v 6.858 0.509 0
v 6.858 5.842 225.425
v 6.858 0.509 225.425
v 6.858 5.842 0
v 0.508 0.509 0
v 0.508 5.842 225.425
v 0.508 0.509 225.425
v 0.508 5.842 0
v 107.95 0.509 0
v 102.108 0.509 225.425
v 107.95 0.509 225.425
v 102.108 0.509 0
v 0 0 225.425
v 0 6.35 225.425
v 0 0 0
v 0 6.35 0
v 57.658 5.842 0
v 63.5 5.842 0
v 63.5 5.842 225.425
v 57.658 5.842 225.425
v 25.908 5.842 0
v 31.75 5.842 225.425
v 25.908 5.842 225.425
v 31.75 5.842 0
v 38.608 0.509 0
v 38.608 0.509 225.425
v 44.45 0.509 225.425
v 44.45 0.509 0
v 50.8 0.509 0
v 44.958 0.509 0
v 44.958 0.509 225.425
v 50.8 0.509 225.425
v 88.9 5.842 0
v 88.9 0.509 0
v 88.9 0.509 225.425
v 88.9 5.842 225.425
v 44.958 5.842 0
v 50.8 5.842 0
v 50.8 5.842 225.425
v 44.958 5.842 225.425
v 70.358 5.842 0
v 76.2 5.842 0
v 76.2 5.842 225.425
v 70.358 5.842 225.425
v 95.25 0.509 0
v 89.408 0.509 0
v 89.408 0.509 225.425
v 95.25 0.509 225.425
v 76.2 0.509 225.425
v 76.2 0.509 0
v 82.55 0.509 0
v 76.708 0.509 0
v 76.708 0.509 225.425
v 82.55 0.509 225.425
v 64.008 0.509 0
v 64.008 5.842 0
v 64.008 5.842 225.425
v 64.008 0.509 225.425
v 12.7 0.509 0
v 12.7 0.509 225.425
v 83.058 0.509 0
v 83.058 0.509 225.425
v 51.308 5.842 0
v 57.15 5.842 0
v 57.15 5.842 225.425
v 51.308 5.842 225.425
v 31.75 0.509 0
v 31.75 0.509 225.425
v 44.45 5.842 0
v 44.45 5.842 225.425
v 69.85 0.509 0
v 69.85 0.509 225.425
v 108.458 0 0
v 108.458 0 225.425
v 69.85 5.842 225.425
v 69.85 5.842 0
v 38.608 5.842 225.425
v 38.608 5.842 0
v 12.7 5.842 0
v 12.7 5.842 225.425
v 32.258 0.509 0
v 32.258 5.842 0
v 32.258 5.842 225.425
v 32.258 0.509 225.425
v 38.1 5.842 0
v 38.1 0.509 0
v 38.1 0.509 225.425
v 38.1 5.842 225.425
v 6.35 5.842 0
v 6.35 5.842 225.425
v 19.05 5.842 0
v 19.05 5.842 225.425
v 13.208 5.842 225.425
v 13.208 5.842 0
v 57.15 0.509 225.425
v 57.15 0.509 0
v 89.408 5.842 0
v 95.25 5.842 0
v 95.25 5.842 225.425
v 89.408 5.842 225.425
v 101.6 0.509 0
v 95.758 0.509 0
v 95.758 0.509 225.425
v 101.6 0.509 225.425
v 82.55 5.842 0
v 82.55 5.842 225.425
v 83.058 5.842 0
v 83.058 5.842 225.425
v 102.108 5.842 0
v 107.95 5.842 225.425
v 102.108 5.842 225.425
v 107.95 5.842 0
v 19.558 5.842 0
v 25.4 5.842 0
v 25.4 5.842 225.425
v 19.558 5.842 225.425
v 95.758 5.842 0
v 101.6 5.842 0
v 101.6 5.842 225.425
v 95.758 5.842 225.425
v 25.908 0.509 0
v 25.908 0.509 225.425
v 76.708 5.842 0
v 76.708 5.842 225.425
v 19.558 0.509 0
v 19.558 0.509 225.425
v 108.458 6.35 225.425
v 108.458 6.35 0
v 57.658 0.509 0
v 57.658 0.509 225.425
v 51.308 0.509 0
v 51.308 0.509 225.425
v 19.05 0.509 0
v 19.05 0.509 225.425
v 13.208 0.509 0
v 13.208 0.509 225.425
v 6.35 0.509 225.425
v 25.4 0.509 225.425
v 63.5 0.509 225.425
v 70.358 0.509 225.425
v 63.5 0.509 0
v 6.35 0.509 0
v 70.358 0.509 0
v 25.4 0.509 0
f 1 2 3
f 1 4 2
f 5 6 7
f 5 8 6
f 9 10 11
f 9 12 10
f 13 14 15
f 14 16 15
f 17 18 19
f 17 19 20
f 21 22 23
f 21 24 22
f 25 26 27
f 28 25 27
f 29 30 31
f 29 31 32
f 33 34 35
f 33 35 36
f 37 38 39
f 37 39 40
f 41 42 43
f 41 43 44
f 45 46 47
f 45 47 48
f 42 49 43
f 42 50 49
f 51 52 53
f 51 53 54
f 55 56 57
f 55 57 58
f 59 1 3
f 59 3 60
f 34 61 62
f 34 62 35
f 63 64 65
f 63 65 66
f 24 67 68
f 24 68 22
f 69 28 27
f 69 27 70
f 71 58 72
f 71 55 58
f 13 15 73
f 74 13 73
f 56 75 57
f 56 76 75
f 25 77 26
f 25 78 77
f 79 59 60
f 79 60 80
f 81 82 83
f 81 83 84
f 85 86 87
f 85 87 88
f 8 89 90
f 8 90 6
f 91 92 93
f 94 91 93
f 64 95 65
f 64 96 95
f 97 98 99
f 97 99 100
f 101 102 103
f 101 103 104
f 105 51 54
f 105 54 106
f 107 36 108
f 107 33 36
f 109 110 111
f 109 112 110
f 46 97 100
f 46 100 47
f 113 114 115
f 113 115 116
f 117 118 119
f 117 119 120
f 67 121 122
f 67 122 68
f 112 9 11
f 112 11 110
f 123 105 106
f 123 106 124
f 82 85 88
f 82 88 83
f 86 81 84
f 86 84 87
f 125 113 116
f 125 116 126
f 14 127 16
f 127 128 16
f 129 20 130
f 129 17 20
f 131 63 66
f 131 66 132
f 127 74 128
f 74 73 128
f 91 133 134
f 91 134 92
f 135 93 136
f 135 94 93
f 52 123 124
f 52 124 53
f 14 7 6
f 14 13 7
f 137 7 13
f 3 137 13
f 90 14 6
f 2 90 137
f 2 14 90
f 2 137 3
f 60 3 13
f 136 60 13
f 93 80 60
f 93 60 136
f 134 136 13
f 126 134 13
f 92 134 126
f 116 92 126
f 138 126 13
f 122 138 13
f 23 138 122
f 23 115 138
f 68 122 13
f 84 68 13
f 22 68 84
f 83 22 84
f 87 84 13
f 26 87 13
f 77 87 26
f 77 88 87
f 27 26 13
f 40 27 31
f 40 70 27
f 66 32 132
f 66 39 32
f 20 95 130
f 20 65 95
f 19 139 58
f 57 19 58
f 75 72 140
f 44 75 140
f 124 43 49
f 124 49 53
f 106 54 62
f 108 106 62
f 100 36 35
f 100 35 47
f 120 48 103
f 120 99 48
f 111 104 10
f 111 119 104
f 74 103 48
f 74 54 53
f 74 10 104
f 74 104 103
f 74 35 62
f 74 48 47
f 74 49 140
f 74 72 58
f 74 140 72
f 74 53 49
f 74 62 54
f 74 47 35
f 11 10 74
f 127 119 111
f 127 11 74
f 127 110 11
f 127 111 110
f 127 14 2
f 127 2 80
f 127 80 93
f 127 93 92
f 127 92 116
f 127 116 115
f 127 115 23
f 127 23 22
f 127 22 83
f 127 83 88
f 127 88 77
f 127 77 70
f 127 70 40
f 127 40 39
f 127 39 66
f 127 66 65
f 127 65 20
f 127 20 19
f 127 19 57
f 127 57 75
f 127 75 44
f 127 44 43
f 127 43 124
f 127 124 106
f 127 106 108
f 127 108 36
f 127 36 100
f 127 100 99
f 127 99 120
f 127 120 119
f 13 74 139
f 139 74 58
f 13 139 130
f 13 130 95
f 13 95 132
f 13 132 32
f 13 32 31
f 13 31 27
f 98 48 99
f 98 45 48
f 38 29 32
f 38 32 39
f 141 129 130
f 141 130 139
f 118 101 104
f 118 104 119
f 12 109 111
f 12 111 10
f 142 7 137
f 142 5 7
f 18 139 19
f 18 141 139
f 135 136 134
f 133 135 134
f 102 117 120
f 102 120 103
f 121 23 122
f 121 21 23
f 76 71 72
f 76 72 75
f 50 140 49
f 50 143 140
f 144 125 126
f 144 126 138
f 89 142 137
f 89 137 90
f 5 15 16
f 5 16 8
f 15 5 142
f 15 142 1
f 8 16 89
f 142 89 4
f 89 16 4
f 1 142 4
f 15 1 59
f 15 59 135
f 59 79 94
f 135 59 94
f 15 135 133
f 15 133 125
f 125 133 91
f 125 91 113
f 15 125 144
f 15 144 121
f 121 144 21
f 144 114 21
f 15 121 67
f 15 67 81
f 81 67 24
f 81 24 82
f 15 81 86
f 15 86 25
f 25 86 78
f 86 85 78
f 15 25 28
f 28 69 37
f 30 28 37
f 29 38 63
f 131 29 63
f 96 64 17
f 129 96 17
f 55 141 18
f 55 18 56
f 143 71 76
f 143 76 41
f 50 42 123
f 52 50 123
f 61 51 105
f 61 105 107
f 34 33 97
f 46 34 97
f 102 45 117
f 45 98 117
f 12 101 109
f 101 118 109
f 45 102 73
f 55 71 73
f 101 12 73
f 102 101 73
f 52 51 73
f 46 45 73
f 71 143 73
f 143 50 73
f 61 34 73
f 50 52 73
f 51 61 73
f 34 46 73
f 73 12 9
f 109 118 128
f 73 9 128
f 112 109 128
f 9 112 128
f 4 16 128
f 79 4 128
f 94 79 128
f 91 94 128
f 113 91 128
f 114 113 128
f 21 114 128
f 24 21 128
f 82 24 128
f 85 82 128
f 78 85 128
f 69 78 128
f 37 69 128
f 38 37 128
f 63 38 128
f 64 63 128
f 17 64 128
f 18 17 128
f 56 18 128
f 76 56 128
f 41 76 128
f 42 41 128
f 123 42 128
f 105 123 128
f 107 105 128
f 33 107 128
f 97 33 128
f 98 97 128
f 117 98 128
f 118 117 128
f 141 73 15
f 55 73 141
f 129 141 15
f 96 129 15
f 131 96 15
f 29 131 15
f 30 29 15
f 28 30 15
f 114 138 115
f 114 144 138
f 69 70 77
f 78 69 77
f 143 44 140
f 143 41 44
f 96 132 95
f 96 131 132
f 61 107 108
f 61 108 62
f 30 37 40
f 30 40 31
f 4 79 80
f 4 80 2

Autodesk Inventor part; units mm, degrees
ref_plane "YZ Plane" through (0, 0, 0) normal (1, 0, 0) x (0, 1, 0)
ref_plane "XZ Plane" through (0, 0, 0) normal (0, 1, 0) x (-1, 0, 0)
ref_plane "XY Plane" through (0, 0, 0) normal (0, 0, 1) x (1, 0, 0)
sketch "Sketch1" plane through (0, 0, 0) normal (0, 0, 1) x (1, 0, 0)
  line L0 (0, 0) -> (108.458, 0)
  line L1 (108.458, 0) -> (108.458, 6.35)
  line L2 (108.458, 6.35) -> (0, 6.35)
  line L3 (0, 6.35) -> (0, 0)
  line L4 (0.508, 0.5094) -> (6.35, 0.5094)
  line L5 (6.35, 0.5094) -> (6.35, 5.842)
  line L6 (6.35, 5.842) -> (0.508, 5.842)
  line L7 (0.508, 5.842) -> (0.508, 0.5094)
  line L8 (6.858, 0.5094) -> (12.7, 0.5094)
  line L9 (12.7, 0.5094) -> (12.7, 5.842)
  line L10 (12.7, 5.842) -> (6.858, 5.842)
  line L11 (6.858, 5.842) -> (6.858, 0.5094)
  line L12 (13.208, 0.5094) -> (19.05, 0.5094)
  line L13 (19.05, 0.5094) -> (19.05, 5.842)
  line L14 (19.05, 5.842) -> (13.208, 5.842)
  line L15 (13.208, 5.842) -> (13.208, 0.5094)
  line L16 (19.558, 0.5094) -> (25.4, 0.5094)
  line L17 (25.4, 0.5094) -> (25.4, 5.842)
  line L18 (25.4, 5.842) -> (19.558, 5.842)
  line L19 (19.558, 5.842) -> (19.558, 0.5094)
  line L20 (25.908, 0.5094) -> (31.75, 0.5094)
  line L21 (31.75, 0.5094) -> (31.75, 5.842)
  line L22 (31.75, 5.842) -> (25.908, 5.842)
  line L23 (25.908, 5.842) -> (25.908, 0.5094)
  line L24 (32.258, 0.5094) -> (38.1, 0.5094)
  line L25 (38.1, 0.5094) -> (38.1, 5.842)
  line L26 (38.1, 5.842) -> (32.258, 5.842)
  line L27 (32.258, 5.842) -> (32.258, 0.5094)
  line L28 (38.608, 0.5094) -> (44.45, 0.5094)
  line L29 (44.45, 0.5094) -> (44.45, 5.842)
  line L30 (44.45, 5.842) -> (38.608, 5.842)
  line L31 (38.608, 5.842) -> (38.608, 0.5094)
  line L32 (44.958, 0.5094) -> (50.8, 0.5094)
  line L33 (50.8, 0.5094) -> (50.8, 5.842)
  line L34 (50.8, 5.842) -> (44.958, 5.842)
  line L35 (44.958, 5.842) -> (44.958, 0.5094)
  line L36 (51.308, 0.5094) -> (57.15, 0.5094)
  line L37 (57.15, 0.5094) -> (57.15, 5.842)
  line L38 (57.15, 5.842) -> (51.308, 5.842)
  line L39 (51.308, 5.842) -> (51.308, 0.5094)
  line L40 (57.658, 0.5094) -> (63.5, 0.5094)
  line L41 (63.5, 0.5094) -> (63.5, 5.842)
  line L42 (63.5, 5.842) -> (57.658, 5.842)
  line L43 (57.658, 5.842) -> (57.658, 0.5094)
  line L44 (64.008, 0.5094) -> (69.85, 0.5094)
  line L45 (69.85, 0.5094) -> (69.85, 5.842)
  line L46 (69.85, 5.842) -> (64.008, 5.842)
  line L47 (64.008, 5.842) -> (64.008, 0.5094)
  line L48 (70.358, 0.5094) -> (76.2, 0.5094)
  line L49 (76.2, 0.5094) -> (76.2, 5.842)
  line L50 (76.2, 5.842) -> (70.358, 5.842)
  line L51 (70.358, 5.842) -> (70.358, 0.5094)
  line L52 (76.708, 0.5094) -> (82.55, 0.5094)
  line L53 (82.55, 0.5094) -> (82.55, 5.842)
  line L54 (82.55, 5.842) -> (76.708, 5.842)
  line L55 (76.708, 5.842) -> (76.708, 0.5094)
  line L56 (83.058, 0.5094) -> (88.9, 0.5094)
  line L57 (88.9, 0.5094) -> (88.9, 5.842)
  line L58 (88.9, 5.842) -> (83.058, 5.842)
  line L59 (83.058, 5.842) -> (83.058, 0.5094)
  line L60 (89.408, 0.5094) -> (95.25, 0.5094)
  line L61 (95.25, 0.5094) -> (95.25, 5.842)
  line L62 (95.25, 5.842) -> (89.408, 5.842)
  line L63 (89.408, 5.842) -> (89.408, 0.5094)
  line L64 (95.758, 0.5094) -> (101.6, 0.5094)
  line L65 (101.6, 0.5094) -> (101.6, 5.842)
  line L66 (101.6, 5.842) -> (95.758, 5.842)
  line L67 (95.758, 5.842) -> (95.758, 0.5094)
  line L68 (102.108, 0.5094) -> (107.95, 0.5094)
  line L69 (107.95, 0.5094) -> (107.95, 5.842)
  line L70 (107.95, 5.842) -> (102.108, 5.842)
  line L71 (102.108, 5.842) -> (102.108, 0.5094)
  dimension "d0" = 108.458
  dimension "d1" = 6.35
  dimension "d2" = 0.5094
  dimension "d3" = 0.508
  dimension "d4" = 0.508
  dimension "d5" = 5.842
  dimension "d8" = 6.35
extrude "Extrusion1" add sketch "Sketch1" along normal blind 225.425
properties part number "8 ball polycarb side"
